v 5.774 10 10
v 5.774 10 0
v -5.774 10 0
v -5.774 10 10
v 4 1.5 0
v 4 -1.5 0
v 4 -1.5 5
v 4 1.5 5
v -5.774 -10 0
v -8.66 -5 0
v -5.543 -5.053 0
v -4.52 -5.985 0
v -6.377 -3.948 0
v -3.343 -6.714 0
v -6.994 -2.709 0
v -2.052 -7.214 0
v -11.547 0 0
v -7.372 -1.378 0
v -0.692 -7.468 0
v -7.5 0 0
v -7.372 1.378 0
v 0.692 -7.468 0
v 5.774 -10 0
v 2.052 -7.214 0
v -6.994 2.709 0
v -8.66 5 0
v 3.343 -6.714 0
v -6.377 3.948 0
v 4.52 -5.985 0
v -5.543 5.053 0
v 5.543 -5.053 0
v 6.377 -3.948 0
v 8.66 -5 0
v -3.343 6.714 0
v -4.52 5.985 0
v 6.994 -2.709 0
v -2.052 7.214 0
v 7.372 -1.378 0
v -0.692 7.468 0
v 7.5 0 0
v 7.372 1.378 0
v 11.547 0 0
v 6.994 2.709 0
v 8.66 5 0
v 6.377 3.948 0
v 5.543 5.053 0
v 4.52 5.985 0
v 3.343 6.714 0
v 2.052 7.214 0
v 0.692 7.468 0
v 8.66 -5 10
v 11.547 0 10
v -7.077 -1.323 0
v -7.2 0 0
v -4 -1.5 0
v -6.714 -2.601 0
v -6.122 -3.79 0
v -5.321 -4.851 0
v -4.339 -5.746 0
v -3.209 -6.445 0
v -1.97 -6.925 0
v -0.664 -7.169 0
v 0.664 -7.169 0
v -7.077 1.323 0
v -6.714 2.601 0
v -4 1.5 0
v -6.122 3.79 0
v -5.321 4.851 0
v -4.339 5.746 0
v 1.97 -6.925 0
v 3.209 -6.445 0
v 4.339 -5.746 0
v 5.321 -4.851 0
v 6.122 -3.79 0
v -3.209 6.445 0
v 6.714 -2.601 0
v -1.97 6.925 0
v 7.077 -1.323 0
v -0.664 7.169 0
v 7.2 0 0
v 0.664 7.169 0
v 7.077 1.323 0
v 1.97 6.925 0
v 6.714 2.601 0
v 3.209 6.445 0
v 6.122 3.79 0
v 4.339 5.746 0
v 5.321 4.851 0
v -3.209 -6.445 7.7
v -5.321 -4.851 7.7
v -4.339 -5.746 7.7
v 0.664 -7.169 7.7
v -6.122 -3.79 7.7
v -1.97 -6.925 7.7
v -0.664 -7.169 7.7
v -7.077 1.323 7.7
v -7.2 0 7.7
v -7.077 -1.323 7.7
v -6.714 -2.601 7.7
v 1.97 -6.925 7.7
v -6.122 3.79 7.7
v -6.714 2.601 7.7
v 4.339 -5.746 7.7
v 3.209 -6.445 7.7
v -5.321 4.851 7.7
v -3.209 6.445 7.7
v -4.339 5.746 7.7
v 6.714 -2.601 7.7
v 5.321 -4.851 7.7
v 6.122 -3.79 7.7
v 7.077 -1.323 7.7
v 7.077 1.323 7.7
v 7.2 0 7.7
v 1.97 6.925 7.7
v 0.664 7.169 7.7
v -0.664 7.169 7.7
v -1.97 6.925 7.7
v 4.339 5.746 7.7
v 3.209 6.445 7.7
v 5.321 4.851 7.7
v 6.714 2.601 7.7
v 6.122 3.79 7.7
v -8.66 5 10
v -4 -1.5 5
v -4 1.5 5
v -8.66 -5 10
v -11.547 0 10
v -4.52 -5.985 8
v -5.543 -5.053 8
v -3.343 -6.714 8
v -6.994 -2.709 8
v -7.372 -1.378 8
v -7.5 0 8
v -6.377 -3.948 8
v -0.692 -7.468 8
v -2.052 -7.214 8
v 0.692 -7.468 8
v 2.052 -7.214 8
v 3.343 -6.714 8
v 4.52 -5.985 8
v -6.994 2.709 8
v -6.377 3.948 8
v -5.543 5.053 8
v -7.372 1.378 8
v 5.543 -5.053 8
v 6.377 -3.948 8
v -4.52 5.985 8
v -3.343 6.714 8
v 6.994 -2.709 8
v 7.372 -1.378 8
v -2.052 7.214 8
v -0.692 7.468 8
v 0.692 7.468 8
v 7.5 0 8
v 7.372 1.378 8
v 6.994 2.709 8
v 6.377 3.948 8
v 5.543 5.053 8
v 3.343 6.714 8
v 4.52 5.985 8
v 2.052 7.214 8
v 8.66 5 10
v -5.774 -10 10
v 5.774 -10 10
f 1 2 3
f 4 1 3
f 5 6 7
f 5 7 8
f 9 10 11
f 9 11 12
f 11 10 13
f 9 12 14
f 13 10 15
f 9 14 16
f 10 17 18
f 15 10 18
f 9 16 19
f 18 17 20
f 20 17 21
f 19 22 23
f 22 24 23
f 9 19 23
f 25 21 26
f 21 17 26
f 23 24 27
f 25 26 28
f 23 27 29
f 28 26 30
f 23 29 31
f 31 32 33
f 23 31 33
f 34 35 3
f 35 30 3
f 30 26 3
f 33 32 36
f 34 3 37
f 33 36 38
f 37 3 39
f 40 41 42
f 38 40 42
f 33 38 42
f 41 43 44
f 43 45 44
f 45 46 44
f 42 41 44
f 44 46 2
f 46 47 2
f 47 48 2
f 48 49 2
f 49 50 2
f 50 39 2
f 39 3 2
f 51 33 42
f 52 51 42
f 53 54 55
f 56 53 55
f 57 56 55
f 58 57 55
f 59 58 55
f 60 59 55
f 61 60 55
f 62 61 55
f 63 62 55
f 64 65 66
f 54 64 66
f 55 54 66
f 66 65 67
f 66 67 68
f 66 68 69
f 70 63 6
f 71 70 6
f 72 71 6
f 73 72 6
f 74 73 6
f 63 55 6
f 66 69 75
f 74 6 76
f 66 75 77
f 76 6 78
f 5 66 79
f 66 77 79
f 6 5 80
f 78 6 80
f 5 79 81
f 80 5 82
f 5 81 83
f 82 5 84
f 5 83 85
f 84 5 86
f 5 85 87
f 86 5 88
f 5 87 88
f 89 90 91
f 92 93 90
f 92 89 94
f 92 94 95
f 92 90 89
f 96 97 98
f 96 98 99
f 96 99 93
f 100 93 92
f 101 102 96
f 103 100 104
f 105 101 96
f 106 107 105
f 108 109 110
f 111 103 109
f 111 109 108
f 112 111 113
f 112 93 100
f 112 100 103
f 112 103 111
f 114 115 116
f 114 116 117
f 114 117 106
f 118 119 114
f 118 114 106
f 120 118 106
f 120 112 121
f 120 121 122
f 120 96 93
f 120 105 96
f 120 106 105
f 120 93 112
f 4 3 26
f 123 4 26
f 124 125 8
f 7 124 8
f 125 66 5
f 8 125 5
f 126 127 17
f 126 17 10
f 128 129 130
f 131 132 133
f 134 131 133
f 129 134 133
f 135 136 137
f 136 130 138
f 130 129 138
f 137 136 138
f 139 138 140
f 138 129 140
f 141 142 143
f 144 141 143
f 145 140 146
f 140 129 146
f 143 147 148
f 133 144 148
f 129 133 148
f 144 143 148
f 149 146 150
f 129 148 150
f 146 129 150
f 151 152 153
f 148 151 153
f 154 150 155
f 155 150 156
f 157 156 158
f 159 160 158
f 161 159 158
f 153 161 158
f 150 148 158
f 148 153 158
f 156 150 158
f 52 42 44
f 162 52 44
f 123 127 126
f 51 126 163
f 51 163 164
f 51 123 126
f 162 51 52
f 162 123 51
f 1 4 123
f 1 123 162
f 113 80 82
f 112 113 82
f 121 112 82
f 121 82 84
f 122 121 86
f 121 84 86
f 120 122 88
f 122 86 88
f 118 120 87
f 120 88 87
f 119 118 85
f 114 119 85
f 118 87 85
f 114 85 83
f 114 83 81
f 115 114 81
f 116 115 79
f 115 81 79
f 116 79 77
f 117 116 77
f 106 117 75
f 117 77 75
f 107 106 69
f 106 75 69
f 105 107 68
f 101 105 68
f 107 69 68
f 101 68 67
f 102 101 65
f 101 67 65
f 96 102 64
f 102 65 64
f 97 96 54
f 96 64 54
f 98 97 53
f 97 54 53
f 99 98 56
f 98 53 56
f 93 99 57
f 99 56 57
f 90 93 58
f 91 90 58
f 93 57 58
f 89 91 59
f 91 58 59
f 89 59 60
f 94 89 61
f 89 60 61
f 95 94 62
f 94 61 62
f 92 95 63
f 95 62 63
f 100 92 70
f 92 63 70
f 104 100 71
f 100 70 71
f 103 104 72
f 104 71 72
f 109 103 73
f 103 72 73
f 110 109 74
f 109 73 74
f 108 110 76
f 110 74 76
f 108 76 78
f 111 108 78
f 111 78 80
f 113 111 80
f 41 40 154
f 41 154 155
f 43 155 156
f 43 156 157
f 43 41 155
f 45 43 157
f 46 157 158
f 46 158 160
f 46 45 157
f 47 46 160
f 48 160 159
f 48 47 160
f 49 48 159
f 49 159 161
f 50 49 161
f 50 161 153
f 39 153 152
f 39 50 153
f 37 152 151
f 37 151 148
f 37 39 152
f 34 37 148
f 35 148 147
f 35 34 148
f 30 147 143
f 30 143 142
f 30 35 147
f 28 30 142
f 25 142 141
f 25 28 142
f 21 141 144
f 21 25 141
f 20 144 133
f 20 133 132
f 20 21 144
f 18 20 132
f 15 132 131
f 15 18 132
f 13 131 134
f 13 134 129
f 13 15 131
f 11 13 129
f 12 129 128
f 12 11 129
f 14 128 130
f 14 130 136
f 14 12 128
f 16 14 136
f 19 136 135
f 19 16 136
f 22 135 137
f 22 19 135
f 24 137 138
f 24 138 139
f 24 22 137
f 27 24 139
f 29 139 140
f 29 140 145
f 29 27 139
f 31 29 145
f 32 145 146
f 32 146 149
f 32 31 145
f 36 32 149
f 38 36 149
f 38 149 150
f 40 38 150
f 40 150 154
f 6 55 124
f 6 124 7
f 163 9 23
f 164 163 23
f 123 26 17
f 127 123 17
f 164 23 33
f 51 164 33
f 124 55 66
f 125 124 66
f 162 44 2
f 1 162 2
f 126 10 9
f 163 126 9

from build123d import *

# Parameters (mm, degrees)
F1_R     = 7.5
F1_R_2   = 7.2
F1_W     = 8
F1_H     = 3
F2_DEPTH = 10
F3_DEPTH = 8
F4_DEPTH = 7.7
F5_DEPTH = 5


with BuildPart() as f2:
    # F1 (on Top) → F2 (new body)
    with BuildSketch(Plane.XY):
        with BuildLine():
            ThreePointArc((8.6602540063, -5.0000000546), (9.6592582547, -2.5881904815), (10, 0))
            ThreePointArc((10, 0), (9.6592582702, 2.5881904239), (8.660254066, 4.9999999513))
            ThreePointArc((8.660254066, 4.9999999513), (5.0000000244, 8.6602540238), (0, 10))
            ThreePointArc((0, 10), (-4.9999999727, 8.6602540536), (-8.6602540063, 5.0000000546))
            ThreePointArc((-8.6602540063, 5.0000000546), (-10, 1.587e-07), (-8.660254165, -4.9999997797))
            ThreePointArc((-8.660254165, -4.9999997797), (-5.0000001101, -8.6602539743), (0, -10))
            ThreePointArc((0, -10), (4.9999999727, -8.6602540536), (8.6602540063, -5.0000000546))
        make_face()
        Circle(F1_R, mode=Mode.SUBTRACT)
        Circle(F1_R)
        Circle(F1_R_2, mode=Mode.SUBTRACT)
        Circle(F1_R_2)
        Rectangle(F1_W, F1_H, mode=Mode.SUBTRACT)
        Rectangle(F1_W, F1_H)
        with BuildLine():
            ThreePointArc((-8.6602540063, 5.0000000546), (-4.9999999727, 8.6602540536), (0, 10))
            Line((0, 10), (-5.7735026919, 10))
            Line((-5.7735026919, 10), (-8.6602540063, 5.0000000546))
        make_face()
        with BuildLine():
            ThreePointArc((0, 10), (5.0000000244, 8.6602540238), (8.660254066, 4.9999999513))
            Line((8.660254066, 4.9999999513), (5.7735026919, 10))
            Line((5.7735026919, 10), (0, 10))
        make_face()
        with BuildLine():
            ThreePointArc((8.660254066, 4.9999999513), (9.6592582702, 2.5881904239), (10, 0))
            ThreePointArc((10, 0), (9.6592582547, -2.5881904815), (8.6602540063, -5.0000000546))
            Line((8.6602540063, -5.0000000546), (11.5470053838, 0))
            Line((11.5470053838, 0), (8.660254066, 4.9999999513))
        make_face()
        with BuildLine():
            Line((5.7735026919, -10), (8.6602540063, -5.0000000546))
            ThreePointArc((8.6602540063, -5.0000000546), (4.9999999727, -8.6602540536), (0, -10))
            Line((0, -10), (5.7735026919, -10))
        make_face()
        with BuildLine():
            Line((-5.7735026919, -10), (0, -10))
            ThreePointArc((0, -10), (-5.0000001101, -8.6602539743), (-8.660254165, -4.9999997797))
            Line((-8.660254165, -4.9999997797), (-5.7735026919, -10))
        make_face()
        with BuildLine():
            ThreePointArc((-8.660254165, -4.9999997797), (-10, 1.587e-07), (-8.6602540063, 5.0000000546))
            Line((-8.6602540063, 5.0000000546), (-11.5470053838, 0))
            Line((-11.5470053838, 0), (-8.660254165, -4.9999997797))
        make_face()
    extrude(amount=F2_DEPTH)

    # F1 (on Top) → F3 (cut)
    with BuildSketch(Plane.XY):
        Circle(F1_R)
        Circle(F1_R_2, mode=Mode.SUBTRACT)
        Circle(F1_R_2)
        Rectangle(F1_W, F1_H, mode=Mode.SUBTRACT)
        Rectangle(F1_W, F1_H)
    extrude(amount=F3_DEPTH, mode=Mode.SUBTRACT)


with BuildPart() as f4:
    # F1 (on Top) → F4 (new body)
    with BuildSketch(Plane.XY):
        Circle(F1_R_2)
        Rectangle(F1_W, F1_H, mode=Mode.SUBTRACT)
        Rectangle(F1_W, F1_H)
    extrude(amount=F4_DEPTH)

    # F1 (on Top) → F5 (cut)
    with BuildSketch(Plane.XY):
        Rectangle(F1_W, F1_H)
    extrude(amount=F5_DEPTH, mode=Mode.SUBTRACT)


solid = Compound([f2.part, f4.part])
